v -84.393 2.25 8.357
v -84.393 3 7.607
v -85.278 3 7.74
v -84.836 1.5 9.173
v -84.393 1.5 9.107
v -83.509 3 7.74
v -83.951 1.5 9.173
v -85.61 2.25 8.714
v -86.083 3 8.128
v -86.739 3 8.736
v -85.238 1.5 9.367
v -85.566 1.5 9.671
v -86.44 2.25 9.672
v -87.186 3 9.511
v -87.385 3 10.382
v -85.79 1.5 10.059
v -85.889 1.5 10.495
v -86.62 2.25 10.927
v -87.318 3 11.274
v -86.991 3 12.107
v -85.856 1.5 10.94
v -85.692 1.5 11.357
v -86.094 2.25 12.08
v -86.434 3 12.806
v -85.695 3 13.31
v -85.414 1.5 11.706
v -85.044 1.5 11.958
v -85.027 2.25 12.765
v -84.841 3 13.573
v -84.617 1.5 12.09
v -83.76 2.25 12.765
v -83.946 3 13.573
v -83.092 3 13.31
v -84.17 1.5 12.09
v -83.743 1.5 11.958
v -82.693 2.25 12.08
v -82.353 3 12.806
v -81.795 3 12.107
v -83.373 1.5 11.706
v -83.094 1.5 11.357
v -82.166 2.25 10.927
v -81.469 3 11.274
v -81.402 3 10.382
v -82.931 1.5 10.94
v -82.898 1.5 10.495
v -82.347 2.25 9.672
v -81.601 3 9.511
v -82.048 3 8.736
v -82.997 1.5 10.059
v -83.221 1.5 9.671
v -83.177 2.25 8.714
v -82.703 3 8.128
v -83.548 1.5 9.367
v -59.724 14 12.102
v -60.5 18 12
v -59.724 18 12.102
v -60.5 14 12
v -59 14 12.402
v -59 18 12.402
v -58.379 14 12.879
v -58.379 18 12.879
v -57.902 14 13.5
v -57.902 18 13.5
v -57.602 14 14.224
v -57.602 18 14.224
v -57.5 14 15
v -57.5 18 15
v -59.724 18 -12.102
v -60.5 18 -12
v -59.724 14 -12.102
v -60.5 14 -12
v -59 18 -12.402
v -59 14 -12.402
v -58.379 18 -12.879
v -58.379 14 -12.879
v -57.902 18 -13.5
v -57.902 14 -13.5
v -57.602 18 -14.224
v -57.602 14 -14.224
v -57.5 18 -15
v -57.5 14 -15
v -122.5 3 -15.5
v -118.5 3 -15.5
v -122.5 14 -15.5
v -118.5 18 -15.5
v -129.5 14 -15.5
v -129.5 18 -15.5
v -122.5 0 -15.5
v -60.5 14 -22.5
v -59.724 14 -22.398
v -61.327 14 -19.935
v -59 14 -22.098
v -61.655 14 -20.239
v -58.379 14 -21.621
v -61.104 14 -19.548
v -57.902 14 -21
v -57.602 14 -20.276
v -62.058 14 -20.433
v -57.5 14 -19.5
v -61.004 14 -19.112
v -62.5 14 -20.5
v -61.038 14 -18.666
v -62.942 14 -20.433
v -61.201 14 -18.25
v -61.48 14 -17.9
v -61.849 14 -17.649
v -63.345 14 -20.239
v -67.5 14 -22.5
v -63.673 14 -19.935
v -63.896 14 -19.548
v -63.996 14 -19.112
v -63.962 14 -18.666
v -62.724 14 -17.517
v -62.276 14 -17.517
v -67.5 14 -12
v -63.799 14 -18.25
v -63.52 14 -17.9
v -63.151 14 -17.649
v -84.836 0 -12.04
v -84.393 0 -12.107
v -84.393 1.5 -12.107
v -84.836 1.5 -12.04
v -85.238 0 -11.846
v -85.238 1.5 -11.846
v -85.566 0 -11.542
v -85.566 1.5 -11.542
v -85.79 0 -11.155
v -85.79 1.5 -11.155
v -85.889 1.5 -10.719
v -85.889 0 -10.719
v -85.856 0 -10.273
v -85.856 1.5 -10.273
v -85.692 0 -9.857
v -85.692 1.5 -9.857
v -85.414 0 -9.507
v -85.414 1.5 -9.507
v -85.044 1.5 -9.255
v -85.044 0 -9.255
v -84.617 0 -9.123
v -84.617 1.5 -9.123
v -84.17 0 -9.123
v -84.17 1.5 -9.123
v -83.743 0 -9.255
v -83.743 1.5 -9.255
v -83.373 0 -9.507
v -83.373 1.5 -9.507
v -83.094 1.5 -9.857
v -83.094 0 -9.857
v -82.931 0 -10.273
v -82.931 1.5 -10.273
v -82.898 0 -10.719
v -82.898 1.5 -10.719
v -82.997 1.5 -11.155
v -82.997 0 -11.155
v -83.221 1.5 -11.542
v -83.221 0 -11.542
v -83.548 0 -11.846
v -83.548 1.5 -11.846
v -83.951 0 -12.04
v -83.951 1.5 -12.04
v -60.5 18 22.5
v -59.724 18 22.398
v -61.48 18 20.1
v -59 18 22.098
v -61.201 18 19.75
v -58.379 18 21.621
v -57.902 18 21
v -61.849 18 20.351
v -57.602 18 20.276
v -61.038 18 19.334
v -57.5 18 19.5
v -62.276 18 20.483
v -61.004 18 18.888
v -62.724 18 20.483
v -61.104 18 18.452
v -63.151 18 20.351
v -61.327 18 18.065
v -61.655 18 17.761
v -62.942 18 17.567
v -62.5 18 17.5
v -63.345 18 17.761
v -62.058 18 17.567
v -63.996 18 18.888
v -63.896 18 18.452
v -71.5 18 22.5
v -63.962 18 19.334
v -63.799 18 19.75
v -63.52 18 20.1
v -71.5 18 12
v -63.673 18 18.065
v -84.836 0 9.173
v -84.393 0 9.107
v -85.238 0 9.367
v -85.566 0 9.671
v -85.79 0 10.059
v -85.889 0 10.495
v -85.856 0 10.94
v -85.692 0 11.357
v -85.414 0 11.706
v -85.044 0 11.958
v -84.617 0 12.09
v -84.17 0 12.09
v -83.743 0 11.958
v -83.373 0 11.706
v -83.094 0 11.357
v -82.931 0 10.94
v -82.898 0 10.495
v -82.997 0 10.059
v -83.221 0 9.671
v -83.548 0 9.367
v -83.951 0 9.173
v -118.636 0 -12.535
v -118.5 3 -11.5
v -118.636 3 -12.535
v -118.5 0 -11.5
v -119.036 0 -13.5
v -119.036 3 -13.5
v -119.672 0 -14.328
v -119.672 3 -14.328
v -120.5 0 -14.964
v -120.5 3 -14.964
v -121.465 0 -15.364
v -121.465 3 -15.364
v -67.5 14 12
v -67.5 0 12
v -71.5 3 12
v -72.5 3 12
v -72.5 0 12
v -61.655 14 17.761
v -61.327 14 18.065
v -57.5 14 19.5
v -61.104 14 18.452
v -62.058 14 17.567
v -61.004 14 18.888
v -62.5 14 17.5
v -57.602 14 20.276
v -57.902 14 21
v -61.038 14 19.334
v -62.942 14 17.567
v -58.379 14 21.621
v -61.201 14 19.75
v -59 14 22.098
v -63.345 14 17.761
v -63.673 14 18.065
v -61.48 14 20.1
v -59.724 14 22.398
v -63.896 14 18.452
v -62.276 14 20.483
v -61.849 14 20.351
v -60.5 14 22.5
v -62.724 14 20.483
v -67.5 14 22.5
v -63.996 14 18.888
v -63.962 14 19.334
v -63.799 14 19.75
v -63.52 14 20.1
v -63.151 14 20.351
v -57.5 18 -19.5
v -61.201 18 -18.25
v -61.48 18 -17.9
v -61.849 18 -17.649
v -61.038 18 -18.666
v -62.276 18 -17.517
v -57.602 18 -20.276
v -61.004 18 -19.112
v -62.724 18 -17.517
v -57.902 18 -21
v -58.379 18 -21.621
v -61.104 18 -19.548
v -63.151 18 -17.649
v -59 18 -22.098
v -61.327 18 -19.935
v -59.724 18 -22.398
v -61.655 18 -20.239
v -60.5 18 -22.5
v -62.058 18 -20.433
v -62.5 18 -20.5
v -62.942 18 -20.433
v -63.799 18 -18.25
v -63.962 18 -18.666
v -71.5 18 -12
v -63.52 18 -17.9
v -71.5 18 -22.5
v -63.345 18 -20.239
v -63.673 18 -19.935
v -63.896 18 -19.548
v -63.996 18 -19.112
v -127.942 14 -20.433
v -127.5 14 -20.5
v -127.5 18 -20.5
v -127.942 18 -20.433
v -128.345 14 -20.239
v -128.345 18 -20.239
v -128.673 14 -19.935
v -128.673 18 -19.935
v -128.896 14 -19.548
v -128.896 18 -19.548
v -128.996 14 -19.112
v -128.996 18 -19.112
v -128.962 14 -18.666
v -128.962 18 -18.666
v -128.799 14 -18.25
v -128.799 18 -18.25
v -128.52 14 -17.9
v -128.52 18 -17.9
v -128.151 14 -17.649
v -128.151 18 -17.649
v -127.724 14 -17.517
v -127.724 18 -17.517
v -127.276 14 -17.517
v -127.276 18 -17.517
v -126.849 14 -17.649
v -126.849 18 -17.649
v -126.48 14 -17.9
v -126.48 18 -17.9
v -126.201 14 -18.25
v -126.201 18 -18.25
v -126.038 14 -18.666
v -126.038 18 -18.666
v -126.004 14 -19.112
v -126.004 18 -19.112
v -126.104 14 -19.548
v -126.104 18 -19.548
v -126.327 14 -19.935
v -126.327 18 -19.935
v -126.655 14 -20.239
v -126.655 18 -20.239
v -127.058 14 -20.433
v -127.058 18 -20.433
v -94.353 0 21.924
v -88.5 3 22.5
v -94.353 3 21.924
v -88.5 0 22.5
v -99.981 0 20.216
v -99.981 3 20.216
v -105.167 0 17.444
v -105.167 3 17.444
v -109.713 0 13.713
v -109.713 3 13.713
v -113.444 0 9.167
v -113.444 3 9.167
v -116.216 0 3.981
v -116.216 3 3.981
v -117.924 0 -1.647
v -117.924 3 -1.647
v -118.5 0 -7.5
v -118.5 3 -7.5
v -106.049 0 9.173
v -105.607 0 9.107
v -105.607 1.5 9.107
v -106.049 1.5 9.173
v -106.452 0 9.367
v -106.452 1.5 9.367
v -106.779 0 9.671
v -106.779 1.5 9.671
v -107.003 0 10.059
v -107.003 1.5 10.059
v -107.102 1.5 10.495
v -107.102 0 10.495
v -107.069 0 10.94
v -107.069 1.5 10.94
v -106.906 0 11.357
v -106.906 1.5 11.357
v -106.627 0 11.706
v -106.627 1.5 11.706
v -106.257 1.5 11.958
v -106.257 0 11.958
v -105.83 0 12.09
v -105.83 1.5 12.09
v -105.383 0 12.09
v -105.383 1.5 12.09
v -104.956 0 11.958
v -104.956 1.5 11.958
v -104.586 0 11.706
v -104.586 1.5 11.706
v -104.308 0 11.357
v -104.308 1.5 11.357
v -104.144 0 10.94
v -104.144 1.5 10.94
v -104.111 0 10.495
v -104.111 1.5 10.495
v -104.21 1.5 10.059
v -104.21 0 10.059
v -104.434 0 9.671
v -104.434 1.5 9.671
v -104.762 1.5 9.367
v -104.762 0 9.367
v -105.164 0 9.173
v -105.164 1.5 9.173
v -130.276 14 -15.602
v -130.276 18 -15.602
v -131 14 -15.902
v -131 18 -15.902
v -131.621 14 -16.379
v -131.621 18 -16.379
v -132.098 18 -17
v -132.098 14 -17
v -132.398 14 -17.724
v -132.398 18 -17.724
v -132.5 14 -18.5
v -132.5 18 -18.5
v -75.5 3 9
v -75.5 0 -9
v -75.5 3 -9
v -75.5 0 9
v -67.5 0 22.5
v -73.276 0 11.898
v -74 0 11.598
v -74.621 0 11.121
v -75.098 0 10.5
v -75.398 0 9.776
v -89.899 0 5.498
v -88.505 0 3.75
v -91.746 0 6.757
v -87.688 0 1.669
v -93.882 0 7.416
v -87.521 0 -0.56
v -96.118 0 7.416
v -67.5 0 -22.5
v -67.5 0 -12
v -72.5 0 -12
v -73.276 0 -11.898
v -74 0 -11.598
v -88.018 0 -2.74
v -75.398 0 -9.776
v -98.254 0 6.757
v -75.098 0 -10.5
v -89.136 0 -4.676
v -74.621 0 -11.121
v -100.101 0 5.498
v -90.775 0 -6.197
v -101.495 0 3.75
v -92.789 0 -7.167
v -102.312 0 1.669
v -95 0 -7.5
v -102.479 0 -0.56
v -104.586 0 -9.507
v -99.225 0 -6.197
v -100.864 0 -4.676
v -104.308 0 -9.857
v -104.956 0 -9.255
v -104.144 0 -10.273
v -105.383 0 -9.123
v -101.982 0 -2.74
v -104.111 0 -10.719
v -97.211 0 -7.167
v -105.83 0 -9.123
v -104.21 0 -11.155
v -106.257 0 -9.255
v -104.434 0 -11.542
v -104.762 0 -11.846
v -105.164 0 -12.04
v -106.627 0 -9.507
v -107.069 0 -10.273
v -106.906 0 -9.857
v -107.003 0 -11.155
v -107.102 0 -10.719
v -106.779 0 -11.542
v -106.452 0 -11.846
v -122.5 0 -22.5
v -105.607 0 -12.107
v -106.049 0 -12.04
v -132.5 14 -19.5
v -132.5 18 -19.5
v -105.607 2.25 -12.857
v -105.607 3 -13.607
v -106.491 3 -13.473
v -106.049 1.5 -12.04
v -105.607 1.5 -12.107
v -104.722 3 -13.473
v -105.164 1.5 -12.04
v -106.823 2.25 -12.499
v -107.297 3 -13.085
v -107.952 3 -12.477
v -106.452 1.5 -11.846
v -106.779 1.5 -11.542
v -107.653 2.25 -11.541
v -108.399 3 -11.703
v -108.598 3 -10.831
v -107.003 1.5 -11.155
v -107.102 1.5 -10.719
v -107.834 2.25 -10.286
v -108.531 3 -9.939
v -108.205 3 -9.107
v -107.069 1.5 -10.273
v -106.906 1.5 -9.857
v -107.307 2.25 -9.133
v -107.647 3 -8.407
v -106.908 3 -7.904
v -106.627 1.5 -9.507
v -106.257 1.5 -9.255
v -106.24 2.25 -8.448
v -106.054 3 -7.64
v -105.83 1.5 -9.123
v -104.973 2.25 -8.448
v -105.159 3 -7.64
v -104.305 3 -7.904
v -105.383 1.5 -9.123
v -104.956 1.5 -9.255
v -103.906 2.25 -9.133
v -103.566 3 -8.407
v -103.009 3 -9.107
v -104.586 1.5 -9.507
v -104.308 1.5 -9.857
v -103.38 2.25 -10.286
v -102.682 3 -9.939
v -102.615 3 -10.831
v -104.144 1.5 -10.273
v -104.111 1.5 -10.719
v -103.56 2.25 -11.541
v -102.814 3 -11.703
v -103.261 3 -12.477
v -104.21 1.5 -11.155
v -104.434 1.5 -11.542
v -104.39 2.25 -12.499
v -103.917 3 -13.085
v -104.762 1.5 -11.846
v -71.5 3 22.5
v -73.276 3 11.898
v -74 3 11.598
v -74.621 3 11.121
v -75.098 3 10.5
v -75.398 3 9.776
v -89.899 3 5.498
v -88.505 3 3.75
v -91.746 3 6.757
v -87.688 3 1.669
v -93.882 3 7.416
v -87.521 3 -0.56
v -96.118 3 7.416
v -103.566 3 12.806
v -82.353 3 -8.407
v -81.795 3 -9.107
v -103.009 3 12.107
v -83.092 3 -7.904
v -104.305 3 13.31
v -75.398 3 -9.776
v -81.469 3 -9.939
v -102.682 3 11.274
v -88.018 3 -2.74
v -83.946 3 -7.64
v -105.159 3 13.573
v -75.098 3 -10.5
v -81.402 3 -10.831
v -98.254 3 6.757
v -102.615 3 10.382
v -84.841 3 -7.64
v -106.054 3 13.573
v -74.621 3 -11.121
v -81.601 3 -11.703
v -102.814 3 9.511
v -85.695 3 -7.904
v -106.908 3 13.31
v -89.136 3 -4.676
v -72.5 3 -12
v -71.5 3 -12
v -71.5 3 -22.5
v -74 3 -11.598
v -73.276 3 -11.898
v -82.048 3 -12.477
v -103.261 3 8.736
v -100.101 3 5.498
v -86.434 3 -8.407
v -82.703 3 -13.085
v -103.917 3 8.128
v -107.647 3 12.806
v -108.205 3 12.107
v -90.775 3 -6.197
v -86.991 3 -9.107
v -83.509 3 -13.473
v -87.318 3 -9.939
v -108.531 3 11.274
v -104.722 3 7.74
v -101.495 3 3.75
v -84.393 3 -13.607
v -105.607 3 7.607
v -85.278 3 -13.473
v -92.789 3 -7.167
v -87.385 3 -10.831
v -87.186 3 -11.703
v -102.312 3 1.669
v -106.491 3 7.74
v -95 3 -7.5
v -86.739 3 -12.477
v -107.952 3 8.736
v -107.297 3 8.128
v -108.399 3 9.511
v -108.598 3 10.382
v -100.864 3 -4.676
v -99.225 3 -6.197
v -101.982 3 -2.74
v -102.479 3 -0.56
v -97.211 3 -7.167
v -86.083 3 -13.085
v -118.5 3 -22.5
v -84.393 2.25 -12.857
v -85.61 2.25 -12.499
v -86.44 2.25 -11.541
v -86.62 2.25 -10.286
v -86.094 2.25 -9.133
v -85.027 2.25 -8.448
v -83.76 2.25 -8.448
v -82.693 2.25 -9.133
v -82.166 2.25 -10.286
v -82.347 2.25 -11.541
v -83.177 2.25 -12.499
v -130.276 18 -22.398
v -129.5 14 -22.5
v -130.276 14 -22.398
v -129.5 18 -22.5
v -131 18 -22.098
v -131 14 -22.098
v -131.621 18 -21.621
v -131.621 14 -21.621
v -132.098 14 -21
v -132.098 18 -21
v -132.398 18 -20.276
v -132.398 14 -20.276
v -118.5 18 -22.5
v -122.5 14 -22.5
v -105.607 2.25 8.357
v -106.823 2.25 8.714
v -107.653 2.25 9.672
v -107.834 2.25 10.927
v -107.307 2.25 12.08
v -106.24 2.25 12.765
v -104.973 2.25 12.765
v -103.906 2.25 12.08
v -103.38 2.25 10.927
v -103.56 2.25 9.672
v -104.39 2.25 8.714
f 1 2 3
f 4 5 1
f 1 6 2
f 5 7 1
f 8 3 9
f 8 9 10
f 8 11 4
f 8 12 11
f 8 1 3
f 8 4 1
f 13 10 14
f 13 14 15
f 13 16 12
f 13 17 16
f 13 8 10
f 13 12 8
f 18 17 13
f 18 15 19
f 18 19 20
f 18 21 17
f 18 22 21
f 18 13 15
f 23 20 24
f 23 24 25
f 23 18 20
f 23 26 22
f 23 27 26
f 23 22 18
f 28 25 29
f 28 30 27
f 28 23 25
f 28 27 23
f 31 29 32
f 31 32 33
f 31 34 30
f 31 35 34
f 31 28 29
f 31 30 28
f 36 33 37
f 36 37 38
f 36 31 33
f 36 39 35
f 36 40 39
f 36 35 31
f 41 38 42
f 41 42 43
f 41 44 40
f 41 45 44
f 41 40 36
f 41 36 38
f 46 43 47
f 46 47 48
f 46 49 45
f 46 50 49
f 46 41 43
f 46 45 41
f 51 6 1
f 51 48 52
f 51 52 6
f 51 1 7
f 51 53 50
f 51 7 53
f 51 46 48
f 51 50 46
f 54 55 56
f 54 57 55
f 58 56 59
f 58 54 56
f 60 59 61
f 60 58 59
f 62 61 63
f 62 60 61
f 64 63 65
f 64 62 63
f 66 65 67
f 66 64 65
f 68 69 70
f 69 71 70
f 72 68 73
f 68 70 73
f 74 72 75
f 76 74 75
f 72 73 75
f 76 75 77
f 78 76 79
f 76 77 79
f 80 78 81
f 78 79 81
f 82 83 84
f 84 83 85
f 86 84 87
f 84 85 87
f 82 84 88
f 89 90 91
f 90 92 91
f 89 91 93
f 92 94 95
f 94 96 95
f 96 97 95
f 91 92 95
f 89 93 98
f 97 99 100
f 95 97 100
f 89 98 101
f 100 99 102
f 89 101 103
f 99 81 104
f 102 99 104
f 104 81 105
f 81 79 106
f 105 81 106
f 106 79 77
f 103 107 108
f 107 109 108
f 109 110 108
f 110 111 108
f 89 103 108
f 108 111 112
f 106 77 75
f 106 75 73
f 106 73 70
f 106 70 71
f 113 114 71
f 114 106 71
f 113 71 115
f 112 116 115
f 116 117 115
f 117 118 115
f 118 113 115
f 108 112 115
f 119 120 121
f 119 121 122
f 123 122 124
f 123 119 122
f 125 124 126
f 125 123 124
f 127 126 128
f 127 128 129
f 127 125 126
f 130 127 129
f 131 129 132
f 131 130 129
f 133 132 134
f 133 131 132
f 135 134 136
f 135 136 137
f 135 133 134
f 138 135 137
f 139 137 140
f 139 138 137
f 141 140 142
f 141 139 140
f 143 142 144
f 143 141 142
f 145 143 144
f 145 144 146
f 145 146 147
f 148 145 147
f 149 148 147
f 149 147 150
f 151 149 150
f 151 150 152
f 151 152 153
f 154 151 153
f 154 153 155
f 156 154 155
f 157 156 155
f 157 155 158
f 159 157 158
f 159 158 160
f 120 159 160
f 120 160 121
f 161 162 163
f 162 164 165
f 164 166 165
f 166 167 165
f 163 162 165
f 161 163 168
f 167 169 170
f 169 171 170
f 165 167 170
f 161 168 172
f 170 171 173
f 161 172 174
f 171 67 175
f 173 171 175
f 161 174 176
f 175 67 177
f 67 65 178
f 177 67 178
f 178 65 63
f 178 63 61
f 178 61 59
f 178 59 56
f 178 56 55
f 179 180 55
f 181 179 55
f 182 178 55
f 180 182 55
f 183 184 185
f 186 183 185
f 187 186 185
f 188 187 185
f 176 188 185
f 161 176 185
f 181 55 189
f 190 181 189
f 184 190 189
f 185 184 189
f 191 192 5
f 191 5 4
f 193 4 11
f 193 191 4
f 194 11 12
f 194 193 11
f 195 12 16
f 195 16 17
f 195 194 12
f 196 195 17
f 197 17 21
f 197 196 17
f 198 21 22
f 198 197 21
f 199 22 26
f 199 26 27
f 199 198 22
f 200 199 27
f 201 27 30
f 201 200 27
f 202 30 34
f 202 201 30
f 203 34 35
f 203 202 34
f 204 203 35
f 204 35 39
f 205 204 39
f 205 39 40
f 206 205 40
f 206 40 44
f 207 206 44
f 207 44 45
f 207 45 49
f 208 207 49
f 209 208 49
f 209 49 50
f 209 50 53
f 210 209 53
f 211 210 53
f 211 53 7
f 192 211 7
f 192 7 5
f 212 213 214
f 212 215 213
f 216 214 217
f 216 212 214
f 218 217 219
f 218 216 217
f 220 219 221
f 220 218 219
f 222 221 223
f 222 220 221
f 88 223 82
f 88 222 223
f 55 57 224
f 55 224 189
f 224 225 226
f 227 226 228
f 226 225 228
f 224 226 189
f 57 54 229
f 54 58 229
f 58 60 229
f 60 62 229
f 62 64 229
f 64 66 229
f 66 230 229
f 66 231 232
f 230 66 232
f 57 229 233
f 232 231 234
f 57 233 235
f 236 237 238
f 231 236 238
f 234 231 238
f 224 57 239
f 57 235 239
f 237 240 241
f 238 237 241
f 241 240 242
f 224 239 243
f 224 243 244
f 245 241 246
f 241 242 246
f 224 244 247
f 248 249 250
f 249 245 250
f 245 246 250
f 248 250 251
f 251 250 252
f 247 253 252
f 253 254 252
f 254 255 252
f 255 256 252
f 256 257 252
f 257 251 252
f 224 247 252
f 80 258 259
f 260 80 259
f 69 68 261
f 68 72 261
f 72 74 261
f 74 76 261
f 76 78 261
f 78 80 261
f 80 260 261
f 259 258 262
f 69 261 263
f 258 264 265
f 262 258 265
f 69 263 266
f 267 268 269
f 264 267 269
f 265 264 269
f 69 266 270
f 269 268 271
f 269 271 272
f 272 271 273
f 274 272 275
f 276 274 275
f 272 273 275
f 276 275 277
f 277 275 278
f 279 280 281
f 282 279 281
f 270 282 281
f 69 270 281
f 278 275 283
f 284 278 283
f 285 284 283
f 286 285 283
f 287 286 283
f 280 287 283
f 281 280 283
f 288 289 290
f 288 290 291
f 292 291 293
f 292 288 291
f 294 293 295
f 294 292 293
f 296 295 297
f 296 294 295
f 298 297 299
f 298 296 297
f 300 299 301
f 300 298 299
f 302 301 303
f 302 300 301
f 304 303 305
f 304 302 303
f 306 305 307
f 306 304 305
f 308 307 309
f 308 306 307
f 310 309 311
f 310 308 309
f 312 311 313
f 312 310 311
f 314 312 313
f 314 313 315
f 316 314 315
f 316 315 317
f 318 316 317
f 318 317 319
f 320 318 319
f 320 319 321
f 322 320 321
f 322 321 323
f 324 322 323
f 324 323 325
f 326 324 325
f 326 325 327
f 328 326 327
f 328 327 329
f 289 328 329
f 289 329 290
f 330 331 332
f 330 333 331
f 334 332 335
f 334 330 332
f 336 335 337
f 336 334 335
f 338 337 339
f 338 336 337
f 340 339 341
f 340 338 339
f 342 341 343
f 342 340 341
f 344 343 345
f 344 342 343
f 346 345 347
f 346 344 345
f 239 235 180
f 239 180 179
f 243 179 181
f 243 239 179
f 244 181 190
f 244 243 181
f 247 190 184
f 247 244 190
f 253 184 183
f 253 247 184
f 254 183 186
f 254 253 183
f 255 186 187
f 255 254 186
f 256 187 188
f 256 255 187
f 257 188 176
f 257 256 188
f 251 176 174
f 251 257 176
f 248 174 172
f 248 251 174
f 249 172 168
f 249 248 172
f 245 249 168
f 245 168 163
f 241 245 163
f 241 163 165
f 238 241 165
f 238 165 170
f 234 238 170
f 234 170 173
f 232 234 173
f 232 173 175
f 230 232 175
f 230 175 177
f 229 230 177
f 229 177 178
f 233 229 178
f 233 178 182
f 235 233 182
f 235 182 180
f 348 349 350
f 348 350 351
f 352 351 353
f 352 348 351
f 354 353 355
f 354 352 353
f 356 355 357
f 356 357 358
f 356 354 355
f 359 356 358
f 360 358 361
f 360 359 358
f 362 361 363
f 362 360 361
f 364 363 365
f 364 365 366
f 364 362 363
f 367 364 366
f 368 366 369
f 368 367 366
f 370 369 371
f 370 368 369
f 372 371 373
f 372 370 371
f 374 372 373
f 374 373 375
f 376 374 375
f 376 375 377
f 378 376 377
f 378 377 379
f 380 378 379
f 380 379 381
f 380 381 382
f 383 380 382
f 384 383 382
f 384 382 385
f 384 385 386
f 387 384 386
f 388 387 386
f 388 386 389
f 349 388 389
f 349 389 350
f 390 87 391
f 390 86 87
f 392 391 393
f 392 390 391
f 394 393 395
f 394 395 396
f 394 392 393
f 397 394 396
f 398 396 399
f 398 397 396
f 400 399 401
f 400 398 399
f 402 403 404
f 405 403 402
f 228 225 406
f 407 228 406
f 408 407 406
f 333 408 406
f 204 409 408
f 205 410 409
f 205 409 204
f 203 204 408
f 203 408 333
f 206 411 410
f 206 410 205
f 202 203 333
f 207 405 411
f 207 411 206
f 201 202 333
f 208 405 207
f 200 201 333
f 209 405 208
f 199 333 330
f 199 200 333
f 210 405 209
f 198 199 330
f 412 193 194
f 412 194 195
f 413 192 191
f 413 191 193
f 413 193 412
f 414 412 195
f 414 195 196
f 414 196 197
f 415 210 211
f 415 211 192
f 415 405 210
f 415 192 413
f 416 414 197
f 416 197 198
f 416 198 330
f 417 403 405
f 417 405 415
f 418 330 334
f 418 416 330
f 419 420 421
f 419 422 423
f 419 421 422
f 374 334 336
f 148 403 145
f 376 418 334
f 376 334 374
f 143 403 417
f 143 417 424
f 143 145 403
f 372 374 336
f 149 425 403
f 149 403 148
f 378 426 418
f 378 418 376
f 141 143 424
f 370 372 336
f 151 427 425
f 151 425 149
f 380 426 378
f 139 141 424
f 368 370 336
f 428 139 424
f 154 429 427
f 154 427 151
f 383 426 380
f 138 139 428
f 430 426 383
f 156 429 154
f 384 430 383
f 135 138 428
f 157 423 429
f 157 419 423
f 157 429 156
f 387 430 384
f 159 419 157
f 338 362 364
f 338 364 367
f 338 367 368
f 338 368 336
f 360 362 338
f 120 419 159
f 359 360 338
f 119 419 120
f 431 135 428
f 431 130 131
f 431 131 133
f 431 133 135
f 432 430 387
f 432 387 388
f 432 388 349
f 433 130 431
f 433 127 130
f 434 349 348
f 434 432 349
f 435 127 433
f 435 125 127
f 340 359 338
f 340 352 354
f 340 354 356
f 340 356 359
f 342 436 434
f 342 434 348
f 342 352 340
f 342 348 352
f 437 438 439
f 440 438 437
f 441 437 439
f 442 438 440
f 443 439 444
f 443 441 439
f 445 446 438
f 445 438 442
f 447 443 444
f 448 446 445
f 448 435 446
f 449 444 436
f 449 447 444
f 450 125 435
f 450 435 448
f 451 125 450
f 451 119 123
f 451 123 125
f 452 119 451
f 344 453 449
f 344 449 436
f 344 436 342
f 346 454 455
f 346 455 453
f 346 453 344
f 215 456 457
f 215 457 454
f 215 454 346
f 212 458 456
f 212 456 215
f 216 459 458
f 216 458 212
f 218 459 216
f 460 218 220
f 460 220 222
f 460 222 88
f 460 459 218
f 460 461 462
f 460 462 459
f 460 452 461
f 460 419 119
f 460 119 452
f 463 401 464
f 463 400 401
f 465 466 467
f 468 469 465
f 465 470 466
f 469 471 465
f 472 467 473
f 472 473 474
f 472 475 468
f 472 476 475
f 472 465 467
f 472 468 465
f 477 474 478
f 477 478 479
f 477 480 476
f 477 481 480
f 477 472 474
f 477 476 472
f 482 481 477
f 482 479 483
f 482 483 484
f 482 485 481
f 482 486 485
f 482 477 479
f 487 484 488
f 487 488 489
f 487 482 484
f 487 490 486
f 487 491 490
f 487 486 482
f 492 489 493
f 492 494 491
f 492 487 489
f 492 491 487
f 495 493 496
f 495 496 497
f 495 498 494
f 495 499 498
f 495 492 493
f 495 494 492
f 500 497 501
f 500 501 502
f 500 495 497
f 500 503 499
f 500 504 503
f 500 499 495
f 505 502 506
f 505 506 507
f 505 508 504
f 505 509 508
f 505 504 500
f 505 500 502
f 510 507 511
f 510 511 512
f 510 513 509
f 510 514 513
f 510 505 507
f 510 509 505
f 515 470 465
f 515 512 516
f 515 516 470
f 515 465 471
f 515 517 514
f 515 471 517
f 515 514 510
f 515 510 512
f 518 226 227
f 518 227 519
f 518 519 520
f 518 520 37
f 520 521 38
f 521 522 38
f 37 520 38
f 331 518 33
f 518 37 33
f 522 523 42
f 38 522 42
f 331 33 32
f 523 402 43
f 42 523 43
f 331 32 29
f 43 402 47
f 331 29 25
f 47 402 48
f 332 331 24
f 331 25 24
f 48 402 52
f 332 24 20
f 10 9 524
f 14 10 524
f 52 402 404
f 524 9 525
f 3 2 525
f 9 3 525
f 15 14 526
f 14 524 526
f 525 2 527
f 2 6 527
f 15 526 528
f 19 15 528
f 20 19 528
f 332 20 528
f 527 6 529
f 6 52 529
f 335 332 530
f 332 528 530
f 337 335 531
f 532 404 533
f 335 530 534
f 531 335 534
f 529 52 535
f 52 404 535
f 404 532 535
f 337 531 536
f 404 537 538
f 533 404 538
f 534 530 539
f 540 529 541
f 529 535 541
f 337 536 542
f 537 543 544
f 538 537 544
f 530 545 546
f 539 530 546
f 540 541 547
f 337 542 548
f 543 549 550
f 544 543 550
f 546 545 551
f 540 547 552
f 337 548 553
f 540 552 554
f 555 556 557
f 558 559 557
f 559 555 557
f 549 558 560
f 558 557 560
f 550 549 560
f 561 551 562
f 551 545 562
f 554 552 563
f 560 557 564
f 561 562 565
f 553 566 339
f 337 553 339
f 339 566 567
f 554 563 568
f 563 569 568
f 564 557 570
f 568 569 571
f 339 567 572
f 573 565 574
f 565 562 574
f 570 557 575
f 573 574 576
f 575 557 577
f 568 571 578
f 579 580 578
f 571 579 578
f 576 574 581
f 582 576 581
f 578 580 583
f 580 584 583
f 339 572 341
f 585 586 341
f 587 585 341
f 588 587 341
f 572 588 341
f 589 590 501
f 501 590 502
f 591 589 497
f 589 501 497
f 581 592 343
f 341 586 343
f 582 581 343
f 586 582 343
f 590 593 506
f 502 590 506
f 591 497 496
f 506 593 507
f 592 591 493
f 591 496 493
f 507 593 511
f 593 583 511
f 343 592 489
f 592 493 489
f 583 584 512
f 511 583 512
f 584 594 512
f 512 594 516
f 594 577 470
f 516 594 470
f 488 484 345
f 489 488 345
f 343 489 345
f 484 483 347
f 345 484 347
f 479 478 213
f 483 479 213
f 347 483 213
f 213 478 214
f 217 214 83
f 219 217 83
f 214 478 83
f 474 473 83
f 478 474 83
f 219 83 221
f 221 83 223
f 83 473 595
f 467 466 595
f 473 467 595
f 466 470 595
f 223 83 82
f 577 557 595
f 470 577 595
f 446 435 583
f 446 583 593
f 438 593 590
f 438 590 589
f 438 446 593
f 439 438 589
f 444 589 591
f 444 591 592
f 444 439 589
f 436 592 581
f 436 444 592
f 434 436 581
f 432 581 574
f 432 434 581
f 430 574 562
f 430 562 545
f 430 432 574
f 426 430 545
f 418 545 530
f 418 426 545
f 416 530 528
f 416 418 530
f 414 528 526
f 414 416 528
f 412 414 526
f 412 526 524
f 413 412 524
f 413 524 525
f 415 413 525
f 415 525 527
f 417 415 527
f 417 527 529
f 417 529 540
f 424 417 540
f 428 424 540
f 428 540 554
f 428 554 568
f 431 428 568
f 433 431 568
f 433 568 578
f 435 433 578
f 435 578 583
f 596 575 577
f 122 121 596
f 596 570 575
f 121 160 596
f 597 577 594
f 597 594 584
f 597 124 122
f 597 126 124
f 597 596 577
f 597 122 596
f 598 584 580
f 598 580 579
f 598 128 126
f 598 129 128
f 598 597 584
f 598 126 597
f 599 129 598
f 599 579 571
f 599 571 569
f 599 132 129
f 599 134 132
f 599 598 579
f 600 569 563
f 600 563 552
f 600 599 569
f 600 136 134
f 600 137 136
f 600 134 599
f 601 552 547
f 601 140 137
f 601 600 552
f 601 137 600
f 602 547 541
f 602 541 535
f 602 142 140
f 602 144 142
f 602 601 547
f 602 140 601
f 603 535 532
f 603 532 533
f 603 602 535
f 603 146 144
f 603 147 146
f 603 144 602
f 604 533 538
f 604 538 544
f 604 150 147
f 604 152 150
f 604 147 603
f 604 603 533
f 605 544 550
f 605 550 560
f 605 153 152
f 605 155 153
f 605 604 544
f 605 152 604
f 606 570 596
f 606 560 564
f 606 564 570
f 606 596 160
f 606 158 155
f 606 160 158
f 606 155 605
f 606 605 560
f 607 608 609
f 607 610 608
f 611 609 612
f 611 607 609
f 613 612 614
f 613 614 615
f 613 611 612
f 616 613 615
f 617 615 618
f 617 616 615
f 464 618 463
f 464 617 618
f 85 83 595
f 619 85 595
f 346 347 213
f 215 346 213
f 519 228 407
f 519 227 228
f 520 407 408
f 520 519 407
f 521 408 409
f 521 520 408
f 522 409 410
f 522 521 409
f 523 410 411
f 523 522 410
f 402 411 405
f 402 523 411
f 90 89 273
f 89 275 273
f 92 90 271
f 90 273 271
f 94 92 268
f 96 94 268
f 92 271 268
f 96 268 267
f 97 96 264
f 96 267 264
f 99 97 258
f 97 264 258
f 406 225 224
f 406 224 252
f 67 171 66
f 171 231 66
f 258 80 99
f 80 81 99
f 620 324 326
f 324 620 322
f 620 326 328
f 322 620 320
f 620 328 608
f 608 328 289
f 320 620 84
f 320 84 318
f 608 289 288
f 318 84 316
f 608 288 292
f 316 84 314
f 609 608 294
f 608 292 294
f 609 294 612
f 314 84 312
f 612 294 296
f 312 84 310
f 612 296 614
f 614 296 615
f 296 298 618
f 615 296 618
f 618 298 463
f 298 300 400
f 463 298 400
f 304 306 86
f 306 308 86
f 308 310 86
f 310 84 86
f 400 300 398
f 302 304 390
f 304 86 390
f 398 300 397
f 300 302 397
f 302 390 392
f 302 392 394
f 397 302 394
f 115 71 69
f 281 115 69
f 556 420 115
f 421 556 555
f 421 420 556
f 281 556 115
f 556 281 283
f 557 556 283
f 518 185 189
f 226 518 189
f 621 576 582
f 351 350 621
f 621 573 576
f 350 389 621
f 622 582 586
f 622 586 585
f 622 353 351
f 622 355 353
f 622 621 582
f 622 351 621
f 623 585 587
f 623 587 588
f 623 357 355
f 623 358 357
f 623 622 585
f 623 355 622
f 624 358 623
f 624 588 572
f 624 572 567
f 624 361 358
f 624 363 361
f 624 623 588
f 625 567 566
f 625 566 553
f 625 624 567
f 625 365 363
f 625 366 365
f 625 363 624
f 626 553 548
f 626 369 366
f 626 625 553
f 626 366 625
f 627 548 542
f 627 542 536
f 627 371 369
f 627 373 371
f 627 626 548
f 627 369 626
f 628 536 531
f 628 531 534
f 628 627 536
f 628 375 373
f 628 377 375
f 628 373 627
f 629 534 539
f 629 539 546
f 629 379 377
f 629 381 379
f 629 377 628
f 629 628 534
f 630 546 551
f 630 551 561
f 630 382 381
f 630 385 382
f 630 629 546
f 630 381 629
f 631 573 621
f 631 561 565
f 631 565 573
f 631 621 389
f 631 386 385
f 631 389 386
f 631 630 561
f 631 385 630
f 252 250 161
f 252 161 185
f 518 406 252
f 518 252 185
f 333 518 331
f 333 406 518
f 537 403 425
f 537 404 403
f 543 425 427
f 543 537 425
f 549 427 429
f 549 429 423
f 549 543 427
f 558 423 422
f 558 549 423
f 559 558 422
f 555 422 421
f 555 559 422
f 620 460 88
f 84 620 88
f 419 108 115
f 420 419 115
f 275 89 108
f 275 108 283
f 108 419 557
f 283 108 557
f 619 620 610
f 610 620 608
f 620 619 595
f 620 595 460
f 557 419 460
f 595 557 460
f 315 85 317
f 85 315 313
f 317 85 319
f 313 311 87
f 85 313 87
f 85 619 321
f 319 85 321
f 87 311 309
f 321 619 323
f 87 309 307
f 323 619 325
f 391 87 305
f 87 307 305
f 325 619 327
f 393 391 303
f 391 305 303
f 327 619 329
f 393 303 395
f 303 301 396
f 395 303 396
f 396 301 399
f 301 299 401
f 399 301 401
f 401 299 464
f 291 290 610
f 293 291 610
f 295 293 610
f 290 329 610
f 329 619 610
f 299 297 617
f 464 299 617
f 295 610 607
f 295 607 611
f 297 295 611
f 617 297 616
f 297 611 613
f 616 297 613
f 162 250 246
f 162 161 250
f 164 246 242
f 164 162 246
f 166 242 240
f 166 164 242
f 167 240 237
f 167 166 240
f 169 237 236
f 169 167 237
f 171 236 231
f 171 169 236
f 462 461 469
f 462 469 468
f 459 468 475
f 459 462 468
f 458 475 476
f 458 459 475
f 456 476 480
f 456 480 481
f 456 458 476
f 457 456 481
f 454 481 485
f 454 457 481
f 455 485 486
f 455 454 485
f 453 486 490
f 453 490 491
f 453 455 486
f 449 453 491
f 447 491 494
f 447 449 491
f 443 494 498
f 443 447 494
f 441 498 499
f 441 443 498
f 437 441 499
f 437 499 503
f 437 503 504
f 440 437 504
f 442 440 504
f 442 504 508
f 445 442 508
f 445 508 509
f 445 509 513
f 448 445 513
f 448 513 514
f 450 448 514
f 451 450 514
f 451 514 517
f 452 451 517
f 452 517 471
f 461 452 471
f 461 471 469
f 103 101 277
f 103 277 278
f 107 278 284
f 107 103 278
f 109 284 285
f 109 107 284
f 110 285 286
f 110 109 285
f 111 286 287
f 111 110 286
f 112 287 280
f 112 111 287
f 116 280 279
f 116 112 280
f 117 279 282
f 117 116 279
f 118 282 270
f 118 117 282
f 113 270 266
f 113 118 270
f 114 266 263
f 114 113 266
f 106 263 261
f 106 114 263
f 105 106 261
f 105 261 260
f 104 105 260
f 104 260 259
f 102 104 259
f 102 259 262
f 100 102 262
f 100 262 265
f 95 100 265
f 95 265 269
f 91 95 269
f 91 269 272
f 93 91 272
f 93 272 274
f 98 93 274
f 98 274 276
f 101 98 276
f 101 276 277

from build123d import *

# Parameters (mm, degrees)
SKETCH_1_W          = 75
SKETCH_1_H          = 45
EXTRUDE_1_DEPTH     = 18
SKETCH_2_W          = 10
SKETCH_2_H          = 45
CUT_EXTRUDE_1_DEPTH = 14
SKETCH_3_W          = 47
SKETCH_3_H          = 45
CUT_EXTRUDE_2_DEPTH = 15
SKETCH_4_R          = 1.5
SKETCH_4_R_2        = 7.5
CUT_EXTRUDE_3_DEPTH = 48.291648311
SKETCH_5_W          = 14
SKETCH_5_H          = 38
CUT_EXTRUDE_4_DEPTH = 48.291648311
FILLET_1_R          = 30
CHAMFER_1_SIZE      = 1.5
SKETCH_8_W          = 36
SKETCH_8_H          = 24
CUT_EXTRUDE_6_DEPTH = 48.291648311
FILLET_2_R          = 3
SKETCH_9_R          = 1.5
CUT_EXTRUDE_7_DEPTH = 46.918405896
FILLET_3_R          = 3
FILLET_4_R          = 4
SKETCH_10_W         = 113.481705681
SKETCH_10_H         = 81.455057911
CUT_EXTRUDE_9_DEPTH = 136.596828871


with BuildPart() as part:
    # 草图1 → 凸台-拉伸1 (new body)
    with BuildSketch(Plane(origin=(0, 0, 0), x_dir=(1, 0, 0), z_dir=(0, 1, 0))):
        Rectangle(SKETCH_1_W, SKETCH_1_H)
    extrude(amount=EXTRUDE_1_DEPTH)

    # 草图2 → 切除-拉伸1 (cut)
    with BuildSketch(Plane.XZ):
        with Locations((-32.5, 0)):
            Rectangle(SKETCH_2_W, SKETCH_2_H)
        with Locations((32.5, 0)):
            Rectangle(SKETCH_2_W, SKETCH_2_H)
    extrude(amount=-CUT_EXTRUDE_1_DEPTH, mode=Mode.SUBTRACT)

    # 草图3 → 切除-拉伸2 (cut)
    with BuildSketch(Plane(origin=(0, 18, 0), x_dir=(1, 0, 0), z_dir=(0, 1, 0))):
        Rectangle(SKETCH_3_W, SKETCH_3_H)
    extrude(amount=-CUT_EXTRUDE_2_DEPTH, mode=Mode.SUBTRACT)

    # 草图4 → 切除-拉伸3 (cut, through all)
    with BuildSketch(Plane.XZ):
        with Locations(Location((10.606601718, 10.606601718, 0), (0, 0, 270))):
            Circle(SKETCH_4_R)
        with Locations(Location((10.606601718, -10.606601718, 0), (0, 0, 270))):
            Circle(SKETCH_4_R)
        with Locations(Location((-10.606601718, -10.606601718, 0), (0, 0, 270))):
            Circle(SKETCH_4_R)
        with Locations(Location((-10.606601718, 10.606601718, 0), (0, 0, 270))):
            Circle(SKETCH_4_R)
        with Locations(Location((0, 0, 0), (0, 0, 270))):
            Circle(SKETCH_4_R_2)
    extrude(amount=-CUT_EXTRUDE_3_DEPTH, mode=Mode.SUBTRACT)

    # 草图5 → 切除-拉伸4 (cut, through all)
    with BuildSketch(Plane(origin=(0, 18, 0), x_dir=(1, 0, 0), z_dir=(0, 1, 0))):
        with Locations((30.5, -3.5)):
            Rectangle(SKETCH_5_W, SKETCH_5_H)
    extrude(amount=-CUT_EXTRUDE_4_DEPTH, mode=Mode.SUBTRACT)

    # 圆角1
    fillet_1_edges = [part.edges().sort_by_distance(p)[0] for p in [
        (23.5, 1.5, 22.5),
    ]]
    fillet(fillet_1_edges, radius=FILLET_1_R)

    # 倒角1
    chamfer_1_edges = [part.edges().sort_by_distance(p)[0] for p in [
        (-10.606601718, 3, 12.106601718),
        (-10.606601718, 3, -9.106601718),
        (10.606601718, 3, -9.106601718),
        (10.606601718, 3, 12.106601718),
    ]]
    chamfer(chamfer_1_edges, length=CHAMFER_1_SIZE)

    # 草图8 → 切除-拉伸6 (cut, through all)
    with BuildSketch(Plane.XZ):
        with Locations((-37.5, 0)):
            Rectangle(SKETCH_8_W, SKETCH_8_H)
    extrude(amount=-CUT_EXTRUDE_6_DEPTH, mode=Mode.SUBTRACT)

    # 圆角2
    fillet_2_edges = [part.edges().sort_by_distance(p)[0] for p in [
        (-19.5, 1.5, 12),
        (-19.5, 1.5, -12),
    ]]
    fillet(fillet_2_edges, radius=FILLET_2_R)

    # 草图9 → 切除-拉伸7 (cut, through all)
    with BuildSketch(Plane.XZ.offset(-14)):
        with Locations(Location((32.5, -19, 0), (0, 0, 270))):
            Circle(SKETCH_9_R)
        with Locations(Location((-32.5, -19, 0), (0, 0, 270))):
            Circle(SKETCH_9_R)
        with Locations(Location((-32.5, 19, 0), (0, 0, 270))):
            Circle(SKETCH_9_R)
    extrude(amount=-CUT_EXTRUDE_7_DEPTH, mode=Mode.SUBTRACT)

    # 圆角3
    fillet_3_edges = [part.edges().sort_by_distance(p)[0] for p in [
        (-37.5, 16, 12),
        (-37.5, 16, -12),
        (-37.5, 16, 22.5),
        (-37.5, 16, -22.5),
        (37.5, 16, -22.5),
        (37.5, 16, -15.5),
    ]]
    fillet(fillet_3_edges, radius=FILLET_3_R)

    # 圆角4
    fillet_4_edges = [part.edges().sort_by_distance(p)[0] for p in [
        (23.5, 1.5, -15.5),
    ]]
    fillet(fillet_4_edges, radius=FILLET_4_R - 0.0001)  # a hair under: the kernel refuses the full size


with BuildPart() as body_2:
    # 镜向1: mirrored copy
    add(part.part.mirror(Plane.ZY.offset(47.5)))


with BuildPart() as part_1:
    add(part.part)

    # 草图10 → 切除-拉伸9 (cut, through all)
    with BuildSketch(Plane.XZ):
        with Locations((9.796228236, -0.64793796)):
            Rectangle(SKETCH_10_W, SKETCH_10_H)
    extrude(amount=-CUT_EXTRUDE_9_DEPTH, mode=Mode.SUBTRACT)


solid = body_2.part
